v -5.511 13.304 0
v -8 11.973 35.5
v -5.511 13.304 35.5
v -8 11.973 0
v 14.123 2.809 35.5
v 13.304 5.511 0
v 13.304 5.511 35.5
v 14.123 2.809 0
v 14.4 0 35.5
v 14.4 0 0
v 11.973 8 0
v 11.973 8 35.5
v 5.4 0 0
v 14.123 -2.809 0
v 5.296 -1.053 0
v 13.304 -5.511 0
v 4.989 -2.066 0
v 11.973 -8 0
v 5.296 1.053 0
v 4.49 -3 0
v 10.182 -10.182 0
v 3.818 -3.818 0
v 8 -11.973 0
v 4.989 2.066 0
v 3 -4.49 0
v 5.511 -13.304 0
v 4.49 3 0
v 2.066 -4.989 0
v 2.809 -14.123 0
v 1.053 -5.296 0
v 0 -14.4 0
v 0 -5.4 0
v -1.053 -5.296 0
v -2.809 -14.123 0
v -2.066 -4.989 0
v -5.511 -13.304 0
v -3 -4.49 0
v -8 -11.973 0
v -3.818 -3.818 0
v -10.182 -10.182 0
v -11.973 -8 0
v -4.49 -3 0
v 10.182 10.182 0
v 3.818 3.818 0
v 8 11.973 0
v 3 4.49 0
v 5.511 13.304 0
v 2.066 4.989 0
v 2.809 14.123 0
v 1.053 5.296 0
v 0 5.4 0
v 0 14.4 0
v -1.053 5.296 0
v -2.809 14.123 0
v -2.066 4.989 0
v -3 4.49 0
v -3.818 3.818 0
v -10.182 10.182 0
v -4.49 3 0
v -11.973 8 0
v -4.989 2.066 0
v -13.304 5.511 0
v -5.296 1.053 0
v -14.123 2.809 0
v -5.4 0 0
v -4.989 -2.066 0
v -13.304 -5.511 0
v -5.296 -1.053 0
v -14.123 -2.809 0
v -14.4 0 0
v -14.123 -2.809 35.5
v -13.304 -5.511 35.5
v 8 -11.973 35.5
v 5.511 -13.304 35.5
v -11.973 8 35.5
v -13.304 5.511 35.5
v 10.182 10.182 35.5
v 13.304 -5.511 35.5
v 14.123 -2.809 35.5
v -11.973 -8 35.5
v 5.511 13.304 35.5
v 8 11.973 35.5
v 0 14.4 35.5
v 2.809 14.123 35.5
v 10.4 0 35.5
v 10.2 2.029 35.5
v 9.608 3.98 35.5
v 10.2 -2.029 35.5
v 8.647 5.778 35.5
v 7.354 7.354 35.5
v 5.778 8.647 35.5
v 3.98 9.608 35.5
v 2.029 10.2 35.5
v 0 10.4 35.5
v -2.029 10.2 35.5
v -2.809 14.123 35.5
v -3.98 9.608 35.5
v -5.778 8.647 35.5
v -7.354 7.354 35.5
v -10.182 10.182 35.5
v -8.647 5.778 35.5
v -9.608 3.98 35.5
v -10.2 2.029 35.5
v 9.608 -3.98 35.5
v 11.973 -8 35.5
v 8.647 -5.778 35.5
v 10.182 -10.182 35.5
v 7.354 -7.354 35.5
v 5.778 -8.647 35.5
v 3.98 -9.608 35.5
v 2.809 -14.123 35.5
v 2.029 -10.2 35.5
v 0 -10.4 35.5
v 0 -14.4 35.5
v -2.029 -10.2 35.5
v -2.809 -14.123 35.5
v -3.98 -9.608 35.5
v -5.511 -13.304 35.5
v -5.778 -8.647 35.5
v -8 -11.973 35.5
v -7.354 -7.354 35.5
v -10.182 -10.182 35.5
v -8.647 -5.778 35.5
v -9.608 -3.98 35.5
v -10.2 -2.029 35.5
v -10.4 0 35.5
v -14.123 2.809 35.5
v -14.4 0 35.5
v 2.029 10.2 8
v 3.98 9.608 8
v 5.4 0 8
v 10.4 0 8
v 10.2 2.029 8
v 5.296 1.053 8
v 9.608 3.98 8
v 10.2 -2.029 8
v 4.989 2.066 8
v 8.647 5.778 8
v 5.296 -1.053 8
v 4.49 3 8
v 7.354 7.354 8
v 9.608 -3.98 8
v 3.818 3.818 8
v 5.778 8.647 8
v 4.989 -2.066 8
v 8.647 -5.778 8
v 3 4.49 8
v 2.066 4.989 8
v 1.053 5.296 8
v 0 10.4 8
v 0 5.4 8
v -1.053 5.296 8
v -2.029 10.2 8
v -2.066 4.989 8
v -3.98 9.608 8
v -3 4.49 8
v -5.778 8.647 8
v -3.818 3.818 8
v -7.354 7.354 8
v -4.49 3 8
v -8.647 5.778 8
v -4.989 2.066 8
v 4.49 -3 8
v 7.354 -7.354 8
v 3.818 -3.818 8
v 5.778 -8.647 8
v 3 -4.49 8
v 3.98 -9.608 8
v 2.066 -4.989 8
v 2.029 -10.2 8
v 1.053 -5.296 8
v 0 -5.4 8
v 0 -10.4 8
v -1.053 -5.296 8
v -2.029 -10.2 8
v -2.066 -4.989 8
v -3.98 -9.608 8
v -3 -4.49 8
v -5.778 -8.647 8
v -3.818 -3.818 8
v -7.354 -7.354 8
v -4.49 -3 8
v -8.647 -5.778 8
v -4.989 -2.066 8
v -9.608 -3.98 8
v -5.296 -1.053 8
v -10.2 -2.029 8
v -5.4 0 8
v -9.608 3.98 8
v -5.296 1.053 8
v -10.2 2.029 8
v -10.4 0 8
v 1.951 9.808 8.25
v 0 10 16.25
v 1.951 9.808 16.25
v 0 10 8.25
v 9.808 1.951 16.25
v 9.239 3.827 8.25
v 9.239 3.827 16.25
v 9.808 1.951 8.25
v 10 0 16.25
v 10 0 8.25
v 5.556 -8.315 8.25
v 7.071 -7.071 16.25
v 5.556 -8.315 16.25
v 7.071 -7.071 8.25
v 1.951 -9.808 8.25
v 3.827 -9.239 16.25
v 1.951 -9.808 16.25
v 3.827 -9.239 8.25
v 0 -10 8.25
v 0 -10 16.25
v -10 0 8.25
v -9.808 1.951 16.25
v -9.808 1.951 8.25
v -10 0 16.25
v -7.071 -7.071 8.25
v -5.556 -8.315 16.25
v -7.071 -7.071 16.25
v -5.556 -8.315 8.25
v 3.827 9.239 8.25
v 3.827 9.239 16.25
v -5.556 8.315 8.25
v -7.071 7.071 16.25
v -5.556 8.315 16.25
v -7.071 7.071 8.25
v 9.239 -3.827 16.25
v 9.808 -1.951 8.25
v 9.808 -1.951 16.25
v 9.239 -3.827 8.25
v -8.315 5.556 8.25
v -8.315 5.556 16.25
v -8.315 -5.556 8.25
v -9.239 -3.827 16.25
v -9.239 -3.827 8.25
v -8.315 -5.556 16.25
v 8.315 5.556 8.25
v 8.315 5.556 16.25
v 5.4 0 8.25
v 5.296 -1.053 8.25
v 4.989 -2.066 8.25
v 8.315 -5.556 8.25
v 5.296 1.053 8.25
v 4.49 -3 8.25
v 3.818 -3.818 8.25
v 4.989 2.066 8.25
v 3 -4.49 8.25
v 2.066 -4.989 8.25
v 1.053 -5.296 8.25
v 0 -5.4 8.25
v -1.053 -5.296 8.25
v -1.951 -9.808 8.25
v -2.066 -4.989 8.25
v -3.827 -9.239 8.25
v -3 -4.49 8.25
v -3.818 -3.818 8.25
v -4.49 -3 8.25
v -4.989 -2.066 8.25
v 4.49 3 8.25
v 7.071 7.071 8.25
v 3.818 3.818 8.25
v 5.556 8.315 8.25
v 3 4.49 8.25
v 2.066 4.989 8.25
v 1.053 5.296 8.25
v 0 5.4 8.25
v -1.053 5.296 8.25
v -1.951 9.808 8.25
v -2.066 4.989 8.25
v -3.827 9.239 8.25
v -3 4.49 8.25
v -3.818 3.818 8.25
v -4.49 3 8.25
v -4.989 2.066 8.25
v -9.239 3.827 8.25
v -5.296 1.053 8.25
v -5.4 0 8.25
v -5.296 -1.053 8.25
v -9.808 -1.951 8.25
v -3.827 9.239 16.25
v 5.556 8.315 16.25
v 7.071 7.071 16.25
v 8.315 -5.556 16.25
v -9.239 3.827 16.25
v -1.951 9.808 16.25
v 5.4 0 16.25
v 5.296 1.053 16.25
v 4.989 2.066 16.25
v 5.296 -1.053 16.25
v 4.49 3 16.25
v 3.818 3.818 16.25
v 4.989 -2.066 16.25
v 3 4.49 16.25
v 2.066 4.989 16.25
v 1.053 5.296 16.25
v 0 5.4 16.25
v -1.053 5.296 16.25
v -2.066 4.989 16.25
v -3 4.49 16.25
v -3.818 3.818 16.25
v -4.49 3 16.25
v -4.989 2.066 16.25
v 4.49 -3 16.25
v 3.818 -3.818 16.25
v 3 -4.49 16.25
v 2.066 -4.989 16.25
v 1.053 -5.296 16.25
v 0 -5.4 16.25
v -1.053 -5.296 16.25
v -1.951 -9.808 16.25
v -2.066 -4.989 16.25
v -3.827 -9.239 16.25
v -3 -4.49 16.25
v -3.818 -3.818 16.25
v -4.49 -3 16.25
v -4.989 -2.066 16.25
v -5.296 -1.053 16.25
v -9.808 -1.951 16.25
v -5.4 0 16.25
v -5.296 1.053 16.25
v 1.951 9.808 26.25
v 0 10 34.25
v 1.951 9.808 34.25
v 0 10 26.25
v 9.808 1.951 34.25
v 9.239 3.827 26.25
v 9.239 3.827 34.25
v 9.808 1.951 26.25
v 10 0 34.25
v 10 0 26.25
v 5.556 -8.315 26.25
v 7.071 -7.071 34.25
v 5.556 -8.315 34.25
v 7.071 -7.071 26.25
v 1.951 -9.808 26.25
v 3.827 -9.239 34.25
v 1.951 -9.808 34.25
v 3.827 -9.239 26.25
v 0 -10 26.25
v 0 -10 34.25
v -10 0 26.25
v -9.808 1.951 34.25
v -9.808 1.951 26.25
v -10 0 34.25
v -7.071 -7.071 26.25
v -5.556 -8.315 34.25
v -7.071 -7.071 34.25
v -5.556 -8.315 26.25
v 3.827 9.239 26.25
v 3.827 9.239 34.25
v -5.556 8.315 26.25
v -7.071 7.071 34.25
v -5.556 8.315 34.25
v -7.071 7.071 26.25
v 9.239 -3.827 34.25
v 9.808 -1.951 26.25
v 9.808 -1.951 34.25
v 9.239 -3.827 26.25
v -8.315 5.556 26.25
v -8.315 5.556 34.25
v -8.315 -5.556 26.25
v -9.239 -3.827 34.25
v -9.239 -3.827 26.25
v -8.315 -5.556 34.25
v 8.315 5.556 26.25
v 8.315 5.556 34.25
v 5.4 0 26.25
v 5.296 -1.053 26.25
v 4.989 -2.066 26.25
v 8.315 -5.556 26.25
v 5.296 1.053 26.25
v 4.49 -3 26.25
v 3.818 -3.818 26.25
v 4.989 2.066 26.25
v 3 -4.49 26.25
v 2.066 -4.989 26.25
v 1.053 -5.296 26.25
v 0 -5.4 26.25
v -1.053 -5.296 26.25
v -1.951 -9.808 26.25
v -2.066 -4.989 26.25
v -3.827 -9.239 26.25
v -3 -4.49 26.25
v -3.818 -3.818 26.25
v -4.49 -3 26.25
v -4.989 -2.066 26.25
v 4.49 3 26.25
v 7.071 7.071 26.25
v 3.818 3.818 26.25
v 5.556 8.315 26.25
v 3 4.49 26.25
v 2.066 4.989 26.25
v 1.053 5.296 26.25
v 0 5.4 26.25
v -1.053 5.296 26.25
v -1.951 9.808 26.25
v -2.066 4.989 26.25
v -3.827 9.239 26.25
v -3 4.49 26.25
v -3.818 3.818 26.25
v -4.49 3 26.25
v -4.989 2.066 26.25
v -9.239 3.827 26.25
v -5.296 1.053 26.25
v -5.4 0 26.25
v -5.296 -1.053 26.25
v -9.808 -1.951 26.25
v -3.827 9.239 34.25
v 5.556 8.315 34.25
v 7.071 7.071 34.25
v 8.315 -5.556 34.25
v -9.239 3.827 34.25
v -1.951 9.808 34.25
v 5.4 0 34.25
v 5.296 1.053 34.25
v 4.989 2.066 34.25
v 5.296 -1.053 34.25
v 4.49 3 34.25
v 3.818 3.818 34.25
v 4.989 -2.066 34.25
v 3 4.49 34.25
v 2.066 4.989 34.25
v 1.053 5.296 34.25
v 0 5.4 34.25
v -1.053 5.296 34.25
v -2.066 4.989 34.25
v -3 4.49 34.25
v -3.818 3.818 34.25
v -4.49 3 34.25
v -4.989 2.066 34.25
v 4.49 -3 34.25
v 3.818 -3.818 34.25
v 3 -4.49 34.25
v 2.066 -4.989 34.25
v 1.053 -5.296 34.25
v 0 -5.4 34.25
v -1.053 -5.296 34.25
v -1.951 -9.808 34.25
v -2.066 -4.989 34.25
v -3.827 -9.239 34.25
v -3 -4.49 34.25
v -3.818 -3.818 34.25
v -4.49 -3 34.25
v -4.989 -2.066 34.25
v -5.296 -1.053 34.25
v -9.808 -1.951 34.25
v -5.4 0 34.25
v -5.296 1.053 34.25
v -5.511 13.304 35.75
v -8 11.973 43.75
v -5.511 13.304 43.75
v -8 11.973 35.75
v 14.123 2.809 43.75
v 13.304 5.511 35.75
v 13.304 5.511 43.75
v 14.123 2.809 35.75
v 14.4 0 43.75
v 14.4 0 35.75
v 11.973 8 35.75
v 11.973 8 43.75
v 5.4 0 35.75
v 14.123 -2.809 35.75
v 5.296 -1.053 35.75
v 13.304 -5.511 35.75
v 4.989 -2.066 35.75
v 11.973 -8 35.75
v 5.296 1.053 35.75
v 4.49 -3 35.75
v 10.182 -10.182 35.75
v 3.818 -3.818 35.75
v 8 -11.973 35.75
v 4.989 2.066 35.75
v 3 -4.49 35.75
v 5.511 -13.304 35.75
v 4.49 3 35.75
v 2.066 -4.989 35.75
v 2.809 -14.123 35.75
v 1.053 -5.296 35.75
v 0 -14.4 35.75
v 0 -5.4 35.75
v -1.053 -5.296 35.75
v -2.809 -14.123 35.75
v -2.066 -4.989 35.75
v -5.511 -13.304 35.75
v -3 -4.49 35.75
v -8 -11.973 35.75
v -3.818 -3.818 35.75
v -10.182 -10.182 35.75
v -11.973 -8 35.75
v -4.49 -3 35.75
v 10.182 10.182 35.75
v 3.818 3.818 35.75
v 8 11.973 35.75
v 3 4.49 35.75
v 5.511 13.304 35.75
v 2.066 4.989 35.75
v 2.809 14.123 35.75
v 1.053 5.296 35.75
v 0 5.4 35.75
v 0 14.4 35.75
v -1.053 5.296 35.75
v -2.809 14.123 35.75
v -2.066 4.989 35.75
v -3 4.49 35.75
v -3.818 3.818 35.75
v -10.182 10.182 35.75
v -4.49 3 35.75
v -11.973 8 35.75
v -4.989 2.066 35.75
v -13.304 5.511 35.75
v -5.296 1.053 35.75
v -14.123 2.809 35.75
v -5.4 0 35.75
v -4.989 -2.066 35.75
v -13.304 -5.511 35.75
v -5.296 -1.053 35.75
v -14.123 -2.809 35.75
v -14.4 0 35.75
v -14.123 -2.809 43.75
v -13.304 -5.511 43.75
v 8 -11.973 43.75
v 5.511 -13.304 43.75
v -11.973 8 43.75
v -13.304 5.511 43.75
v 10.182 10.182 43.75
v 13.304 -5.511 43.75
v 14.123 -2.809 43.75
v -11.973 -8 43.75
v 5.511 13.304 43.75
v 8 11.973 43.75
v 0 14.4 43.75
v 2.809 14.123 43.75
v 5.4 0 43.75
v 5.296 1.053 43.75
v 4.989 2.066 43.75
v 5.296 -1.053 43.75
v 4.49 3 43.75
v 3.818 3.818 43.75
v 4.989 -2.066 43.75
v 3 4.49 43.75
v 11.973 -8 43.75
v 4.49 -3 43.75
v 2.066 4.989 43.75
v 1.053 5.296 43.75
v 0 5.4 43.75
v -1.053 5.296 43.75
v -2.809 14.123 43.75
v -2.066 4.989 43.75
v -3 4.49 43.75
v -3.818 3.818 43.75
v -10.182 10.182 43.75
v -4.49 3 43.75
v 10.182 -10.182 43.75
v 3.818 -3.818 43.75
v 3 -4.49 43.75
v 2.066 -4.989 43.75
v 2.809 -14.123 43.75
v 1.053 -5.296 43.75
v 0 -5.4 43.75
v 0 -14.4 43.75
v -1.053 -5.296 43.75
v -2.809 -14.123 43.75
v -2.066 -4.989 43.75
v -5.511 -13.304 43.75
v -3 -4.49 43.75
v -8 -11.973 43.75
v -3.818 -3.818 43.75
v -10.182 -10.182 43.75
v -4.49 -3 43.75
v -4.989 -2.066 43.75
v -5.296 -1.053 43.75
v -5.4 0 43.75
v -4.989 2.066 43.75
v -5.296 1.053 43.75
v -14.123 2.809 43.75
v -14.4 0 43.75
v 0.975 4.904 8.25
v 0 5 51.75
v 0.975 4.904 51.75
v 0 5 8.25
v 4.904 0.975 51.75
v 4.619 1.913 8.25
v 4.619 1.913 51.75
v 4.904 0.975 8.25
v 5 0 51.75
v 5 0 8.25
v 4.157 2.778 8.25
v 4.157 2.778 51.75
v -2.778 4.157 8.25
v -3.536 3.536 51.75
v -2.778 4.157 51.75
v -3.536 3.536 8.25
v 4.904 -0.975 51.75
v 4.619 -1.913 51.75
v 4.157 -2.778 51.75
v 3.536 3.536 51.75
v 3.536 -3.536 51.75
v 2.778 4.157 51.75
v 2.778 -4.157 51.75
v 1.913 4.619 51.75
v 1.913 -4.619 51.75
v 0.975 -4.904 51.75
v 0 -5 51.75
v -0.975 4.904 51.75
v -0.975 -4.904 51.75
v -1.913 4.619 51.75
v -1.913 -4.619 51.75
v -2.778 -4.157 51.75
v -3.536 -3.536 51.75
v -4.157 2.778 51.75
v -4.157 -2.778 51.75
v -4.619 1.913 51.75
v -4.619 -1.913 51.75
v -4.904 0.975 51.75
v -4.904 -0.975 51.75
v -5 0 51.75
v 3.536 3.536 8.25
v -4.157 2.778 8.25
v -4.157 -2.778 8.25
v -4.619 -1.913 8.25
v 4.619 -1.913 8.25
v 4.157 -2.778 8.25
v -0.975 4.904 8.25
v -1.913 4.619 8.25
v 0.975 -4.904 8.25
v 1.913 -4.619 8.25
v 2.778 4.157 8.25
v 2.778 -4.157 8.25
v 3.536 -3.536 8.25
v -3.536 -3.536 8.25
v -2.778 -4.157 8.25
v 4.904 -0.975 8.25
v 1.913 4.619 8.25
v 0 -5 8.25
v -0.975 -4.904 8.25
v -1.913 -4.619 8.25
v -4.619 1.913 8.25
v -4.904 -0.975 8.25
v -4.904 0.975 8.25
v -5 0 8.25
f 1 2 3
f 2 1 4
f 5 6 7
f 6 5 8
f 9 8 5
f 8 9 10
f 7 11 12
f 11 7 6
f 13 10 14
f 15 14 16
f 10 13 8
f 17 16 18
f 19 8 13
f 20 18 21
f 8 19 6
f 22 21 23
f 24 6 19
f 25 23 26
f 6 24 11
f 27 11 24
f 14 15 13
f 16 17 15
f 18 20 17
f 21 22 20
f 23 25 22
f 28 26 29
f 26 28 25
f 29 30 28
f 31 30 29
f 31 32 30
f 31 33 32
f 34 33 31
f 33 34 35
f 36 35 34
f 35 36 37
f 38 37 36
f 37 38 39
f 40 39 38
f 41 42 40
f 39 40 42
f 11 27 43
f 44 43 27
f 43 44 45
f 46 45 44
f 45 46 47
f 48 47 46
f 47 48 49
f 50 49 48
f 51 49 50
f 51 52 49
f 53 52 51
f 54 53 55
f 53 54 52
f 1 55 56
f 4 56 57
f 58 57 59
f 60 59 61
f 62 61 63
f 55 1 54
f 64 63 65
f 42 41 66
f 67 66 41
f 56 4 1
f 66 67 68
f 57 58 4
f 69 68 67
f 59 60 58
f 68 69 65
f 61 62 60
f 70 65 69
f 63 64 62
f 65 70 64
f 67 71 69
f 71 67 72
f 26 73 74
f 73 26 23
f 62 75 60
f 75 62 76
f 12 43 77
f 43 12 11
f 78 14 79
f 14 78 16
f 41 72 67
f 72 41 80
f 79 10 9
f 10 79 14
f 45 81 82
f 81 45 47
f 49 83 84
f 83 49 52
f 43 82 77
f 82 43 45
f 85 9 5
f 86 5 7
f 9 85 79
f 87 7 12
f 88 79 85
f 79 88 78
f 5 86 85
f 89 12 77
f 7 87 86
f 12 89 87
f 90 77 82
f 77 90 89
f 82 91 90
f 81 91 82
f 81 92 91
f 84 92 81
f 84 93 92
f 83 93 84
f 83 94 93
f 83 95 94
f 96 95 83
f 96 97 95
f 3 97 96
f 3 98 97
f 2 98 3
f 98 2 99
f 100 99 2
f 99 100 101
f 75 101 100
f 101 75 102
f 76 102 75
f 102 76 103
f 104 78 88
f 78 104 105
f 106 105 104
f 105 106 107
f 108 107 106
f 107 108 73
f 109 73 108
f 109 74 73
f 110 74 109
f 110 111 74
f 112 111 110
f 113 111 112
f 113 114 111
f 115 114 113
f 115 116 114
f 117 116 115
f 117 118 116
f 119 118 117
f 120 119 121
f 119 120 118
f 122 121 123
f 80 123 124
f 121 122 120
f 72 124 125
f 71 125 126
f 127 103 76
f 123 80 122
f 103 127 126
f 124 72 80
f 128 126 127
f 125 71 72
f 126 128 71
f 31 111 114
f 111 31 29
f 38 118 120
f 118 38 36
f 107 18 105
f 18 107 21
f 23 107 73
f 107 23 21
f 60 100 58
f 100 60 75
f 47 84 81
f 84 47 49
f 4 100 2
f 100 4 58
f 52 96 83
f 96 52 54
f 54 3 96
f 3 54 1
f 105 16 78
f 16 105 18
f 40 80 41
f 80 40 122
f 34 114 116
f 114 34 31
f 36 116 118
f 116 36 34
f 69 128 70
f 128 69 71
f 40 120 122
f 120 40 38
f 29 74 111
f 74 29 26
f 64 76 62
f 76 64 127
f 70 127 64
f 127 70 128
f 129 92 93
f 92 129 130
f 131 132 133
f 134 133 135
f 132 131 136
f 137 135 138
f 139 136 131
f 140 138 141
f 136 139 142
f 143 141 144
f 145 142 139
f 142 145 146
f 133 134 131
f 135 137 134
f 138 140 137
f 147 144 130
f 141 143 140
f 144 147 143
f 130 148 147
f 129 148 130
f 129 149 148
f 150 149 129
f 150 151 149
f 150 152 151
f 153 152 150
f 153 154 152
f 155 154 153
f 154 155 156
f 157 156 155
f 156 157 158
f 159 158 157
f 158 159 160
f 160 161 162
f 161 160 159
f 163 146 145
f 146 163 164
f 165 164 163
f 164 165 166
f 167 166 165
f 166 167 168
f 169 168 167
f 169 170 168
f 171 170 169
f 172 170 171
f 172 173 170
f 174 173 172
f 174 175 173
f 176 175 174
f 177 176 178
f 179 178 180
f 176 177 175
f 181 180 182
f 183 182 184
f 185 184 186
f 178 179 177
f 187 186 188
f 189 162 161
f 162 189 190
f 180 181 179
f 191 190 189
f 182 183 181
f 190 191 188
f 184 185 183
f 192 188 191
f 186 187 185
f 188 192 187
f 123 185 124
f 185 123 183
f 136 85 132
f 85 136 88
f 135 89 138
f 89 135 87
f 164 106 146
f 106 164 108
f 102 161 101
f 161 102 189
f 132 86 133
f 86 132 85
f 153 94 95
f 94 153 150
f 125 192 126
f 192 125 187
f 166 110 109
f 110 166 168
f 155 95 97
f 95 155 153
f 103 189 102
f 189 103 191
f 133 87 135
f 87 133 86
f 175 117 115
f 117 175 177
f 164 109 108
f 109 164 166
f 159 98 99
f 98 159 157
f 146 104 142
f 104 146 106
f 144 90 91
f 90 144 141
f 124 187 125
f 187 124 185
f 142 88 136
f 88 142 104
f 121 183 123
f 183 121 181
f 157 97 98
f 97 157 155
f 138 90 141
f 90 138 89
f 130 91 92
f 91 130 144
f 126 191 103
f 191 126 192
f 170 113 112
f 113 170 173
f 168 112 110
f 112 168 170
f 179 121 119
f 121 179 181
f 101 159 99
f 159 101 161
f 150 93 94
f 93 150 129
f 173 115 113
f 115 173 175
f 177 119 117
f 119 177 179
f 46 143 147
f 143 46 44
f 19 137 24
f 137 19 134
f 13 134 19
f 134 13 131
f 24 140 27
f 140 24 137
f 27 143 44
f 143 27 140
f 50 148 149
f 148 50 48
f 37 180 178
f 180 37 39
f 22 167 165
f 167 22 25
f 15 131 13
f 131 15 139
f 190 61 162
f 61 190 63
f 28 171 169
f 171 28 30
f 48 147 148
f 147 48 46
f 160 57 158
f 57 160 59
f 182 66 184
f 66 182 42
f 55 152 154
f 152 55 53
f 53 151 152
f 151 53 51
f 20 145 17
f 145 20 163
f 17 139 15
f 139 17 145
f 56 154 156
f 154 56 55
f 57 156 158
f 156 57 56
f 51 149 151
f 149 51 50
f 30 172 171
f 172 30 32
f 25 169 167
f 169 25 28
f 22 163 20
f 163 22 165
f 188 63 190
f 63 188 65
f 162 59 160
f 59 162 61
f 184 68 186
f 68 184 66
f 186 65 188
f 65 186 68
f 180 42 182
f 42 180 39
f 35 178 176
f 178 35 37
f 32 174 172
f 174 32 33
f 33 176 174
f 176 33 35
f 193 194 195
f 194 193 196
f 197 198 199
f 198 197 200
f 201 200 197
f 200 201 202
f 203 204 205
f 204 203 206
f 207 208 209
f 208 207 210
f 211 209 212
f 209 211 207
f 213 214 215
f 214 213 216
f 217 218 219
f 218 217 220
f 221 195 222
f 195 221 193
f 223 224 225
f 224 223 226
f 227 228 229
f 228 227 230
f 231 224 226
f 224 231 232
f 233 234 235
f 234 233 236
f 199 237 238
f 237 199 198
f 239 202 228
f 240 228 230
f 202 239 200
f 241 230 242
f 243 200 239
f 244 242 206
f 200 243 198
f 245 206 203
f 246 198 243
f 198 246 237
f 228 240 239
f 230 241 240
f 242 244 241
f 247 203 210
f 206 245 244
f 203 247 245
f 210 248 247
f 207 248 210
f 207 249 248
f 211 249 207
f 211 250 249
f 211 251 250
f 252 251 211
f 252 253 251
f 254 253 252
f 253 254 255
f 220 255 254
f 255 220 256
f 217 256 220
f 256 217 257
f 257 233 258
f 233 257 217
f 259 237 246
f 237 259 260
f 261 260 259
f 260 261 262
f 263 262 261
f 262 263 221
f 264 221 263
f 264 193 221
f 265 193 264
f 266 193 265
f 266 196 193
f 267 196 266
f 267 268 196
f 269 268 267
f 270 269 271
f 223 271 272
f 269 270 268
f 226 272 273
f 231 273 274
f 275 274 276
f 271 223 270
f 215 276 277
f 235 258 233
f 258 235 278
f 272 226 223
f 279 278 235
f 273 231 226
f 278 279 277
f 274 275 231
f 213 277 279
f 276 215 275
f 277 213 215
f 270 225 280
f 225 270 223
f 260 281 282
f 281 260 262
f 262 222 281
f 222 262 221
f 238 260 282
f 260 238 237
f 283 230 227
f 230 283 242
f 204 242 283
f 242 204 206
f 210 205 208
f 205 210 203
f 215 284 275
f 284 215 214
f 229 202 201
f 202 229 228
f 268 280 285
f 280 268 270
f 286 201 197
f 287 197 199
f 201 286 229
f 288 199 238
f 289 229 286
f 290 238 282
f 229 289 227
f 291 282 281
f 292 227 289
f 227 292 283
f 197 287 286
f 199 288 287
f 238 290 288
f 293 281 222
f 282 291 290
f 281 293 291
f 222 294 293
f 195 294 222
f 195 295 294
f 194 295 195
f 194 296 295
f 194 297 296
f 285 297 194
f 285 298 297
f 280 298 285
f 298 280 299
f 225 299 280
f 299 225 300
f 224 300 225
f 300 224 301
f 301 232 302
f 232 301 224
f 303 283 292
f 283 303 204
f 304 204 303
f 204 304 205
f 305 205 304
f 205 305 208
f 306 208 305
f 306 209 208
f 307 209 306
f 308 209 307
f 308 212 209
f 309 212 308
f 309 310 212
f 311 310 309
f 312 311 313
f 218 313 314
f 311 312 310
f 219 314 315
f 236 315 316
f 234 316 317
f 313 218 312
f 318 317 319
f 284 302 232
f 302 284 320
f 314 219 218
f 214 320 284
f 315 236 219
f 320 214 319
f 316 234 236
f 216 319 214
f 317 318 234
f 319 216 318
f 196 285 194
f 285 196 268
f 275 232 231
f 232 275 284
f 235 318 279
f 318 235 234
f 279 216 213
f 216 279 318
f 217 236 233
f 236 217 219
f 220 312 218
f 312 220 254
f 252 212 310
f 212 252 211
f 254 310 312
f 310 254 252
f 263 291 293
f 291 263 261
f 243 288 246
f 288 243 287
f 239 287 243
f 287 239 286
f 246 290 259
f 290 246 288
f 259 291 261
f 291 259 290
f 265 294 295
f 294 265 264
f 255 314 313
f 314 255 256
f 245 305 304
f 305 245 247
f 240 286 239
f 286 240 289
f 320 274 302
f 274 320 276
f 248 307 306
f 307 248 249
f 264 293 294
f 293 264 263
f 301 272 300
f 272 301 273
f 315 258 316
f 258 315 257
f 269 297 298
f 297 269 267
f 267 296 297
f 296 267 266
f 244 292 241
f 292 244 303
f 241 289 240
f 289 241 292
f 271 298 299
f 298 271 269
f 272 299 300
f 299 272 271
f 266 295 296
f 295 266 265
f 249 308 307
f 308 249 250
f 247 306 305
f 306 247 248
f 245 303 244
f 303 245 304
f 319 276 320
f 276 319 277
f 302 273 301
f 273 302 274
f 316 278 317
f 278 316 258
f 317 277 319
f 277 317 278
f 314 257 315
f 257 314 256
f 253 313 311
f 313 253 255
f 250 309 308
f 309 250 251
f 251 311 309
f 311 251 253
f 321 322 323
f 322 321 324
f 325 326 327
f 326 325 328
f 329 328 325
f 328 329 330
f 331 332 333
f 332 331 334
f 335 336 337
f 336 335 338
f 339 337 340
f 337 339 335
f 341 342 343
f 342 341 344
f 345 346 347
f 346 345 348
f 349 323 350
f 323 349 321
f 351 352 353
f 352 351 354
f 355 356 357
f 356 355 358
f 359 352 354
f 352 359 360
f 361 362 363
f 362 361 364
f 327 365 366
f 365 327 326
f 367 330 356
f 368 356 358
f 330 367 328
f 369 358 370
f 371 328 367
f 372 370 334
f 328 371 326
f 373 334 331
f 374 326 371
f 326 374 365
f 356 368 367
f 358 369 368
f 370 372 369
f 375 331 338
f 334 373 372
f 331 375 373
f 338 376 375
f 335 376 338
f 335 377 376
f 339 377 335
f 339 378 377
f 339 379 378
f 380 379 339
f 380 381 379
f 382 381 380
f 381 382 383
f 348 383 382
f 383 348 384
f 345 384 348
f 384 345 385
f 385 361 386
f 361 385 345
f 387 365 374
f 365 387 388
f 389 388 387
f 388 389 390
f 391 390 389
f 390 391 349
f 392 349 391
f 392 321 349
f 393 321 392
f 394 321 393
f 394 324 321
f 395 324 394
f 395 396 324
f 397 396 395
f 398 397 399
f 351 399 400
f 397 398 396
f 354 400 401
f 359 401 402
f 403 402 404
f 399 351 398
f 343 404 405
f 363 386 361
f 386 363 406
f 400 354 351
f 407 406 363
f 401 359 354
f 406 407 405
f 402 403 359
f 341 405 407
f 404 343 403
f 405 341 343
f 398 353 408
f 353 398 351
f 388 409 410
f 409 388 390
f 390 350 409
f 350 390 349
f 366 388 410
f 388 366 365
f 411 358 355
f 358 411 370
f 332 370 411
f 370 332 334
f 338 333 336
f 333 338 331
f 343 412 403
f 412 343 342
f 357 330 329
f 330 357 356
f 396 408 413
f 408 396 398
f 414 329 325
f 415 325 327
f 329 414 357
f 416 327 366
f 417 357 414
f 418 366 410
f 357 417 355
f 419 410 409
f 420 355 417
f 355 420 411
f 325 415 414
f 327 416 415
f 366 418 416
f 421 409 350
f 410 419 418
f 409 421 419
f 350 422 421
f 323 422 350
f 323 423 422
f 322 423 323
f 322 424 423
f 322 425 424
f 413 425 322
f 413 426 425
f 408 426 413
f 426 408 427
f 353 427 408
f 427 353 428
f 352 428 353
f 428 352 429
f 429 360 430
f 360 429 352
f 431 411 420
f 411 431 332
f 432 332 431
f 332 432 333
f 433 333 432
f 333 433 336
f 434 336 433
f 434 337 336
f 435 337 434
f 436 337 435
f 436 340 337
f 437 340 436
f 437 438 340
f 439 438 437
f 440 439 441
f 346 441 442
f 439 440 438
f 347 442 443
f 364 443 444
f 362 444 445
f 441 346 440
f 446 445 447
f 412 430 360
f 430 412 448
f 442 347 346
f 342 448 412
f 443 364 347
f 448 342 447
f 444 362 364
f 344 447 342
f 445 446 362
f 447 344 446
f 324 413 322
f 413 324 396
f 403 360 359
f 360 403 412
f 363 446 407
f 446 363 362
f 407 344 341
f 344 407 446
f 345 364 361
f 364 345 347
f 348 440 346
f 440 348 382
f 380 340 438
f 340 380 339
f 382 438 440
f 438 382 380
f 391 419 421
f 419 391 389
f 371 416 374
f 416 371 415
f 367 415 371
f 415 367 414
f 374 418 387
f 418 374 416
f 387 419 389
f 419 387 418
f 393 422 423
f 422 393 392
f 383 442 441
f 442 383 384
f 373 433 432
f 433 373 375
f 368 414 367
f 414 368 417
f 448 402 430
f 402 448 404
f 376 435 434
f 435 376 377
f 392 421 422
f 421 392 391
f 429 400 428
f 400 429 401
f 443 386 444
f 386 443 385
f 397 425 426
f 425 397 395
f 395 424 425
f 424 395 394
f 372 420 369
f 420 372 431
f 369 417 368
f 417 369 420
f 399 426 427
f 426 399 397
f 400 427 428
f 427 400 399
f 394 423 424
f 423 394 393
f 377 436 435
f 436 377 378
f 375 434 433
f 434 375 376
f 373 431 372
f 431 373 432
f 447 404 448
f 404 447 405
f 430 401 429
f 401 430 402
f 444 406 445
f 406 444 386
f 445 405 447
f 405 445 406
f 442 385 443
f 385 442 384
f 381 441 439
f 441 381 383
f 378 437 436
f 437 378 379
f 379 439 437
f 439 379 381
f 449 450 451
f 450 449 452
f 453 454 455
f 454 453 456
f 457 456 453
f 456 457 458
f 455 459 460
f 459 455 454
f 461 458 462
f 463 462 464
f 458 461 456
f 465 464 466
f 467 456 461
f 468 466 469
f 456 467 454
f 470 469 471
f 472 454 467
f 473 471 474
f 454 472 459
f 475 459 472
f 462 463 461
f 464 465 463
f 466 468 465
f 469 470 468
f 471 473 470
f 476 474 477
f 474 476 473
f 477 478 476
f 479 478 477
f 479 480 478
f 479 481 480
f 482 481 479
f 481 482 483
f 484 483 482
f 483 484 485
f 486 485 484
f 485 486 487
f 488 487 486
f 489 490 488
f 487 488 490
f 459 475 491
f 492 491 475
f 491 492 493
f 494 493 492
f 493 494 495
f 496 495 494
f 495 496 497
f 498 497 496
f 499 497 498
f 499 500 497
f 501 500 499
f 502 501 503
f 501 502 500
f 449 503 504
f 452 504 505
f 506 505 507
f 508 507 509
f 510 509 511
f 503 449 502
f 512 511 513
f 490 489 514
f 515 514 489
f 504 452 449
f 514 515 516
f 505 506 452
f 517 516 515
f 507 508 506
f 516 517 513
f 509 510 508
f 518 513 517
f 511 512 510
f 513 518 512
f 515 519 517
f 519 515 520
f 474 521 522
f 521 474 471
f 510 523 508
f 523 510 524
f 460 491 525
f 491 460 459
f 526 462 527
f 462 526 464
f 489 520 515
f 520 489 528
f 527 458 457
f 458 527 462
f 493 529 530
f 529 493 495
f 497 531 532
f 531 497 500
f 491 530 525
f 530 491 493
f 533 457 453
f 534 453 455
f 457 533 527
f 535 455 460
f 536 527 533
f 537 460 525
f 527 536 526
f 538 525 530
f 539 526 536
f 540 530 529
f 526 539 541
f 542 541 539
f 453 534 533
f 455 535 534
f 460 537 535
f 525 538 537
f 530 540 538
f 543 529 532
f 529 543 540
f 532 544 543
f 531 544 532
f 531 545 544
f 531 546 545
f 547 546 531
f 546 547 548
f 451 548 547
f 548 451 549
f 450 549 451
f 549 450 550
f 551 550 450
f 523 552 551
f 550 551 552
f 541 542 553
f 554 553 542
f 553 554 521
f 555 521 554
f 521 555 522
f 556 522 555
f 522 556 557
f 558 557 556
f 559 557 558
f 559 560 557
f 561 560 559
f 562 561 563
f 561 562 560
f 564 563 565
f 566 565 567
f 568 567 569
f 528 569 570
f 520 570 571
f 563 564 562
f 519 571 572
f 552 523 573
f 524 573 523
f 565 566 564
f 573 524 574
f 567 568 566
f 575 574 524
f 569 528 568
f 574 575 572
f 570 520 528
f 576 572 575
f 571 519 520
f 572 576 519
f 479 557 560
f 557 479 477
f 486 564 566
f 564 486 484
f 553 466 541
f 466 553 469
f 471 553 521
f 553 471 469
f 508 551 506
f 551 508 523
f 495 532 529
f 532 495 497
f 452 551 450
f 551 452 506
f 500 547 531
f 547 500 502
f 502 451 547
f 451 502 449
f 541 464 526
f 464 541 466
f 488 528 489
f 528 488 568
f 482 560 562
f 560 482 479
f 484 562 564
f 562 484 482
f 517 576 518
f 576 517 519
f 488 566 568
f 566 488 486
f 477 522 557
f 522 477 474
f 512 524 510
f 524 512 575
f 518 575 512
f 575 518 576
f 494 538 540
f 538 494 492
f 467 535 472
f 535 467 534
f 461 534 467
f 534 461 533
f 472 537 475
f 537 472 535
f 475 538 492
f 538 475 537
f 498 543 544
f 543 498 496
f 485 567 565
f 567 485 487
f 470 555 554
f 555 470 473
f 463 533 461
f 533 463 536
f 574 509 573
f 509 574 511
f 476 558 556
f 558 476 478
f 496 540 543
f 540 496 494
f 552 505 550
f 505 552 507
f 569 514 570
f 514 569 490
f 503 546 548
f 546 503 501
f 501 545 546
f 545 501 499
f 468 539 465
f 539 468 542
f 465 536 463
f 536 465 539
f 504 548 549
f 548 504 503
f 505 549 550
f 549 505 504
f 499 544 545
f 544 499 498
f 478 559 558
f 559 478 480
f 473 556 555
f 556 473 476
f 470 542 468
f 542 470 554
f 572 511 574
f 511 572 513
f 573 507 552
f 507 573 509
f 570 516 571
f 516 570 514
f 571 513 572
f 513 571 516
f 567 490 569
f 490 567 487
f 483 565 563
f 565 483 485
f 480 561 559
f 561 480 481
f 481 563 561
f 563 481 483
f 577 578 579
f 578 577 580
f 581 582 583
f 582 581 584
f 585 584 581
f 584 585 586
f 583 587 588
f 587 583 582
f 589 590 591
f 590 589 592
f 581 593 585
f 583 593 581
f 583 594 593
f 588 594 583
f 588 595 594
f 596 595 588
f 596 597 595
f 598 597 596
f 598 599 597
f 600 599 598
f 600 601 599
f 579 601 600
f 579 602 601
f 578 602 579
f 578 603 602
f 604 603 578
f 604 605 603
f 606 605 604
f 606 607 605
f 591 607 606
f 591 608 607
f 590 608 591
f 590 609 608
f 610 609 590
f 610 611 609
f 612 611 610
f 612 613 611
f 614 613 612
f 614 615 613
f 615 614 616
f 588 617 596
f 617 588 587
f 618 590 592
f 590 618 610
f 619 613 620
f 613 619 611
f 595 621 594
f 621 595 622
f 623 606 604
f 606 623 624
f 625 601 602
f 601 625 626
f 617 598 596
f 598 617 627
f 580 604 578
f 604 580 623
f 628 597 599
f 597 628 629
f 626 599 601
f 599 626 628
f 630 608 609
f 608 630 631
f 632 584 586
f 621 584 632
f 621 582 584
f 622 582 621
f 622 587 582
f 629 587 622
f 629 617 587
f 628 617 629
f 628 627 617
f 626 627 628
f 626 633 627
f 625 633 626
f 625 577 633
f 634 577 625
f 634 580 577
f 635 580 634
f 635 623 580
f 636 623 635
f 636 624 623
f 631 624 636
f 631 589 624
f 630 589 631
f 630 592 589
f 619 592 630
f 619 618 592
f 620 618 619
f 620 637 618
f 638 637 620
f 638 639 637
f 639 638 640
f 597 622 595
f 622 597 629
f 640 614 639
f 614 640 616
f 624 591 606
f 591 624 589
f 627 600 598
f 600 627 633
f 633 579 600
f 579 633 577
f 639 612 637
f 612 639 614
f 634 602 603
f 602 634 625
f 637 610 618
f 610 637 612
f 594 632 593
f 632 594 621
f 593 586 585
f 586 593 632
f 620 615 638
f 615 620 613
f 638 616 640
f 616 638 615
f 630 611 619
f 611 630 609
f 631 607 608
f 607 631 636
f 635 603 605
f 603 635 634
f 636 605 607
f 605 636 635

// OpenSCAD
$fn = 32;

// ------------------------------------------------------------------------
// Shaft station: cup d28.8 x 35.5 mm, shaft d10
// Every part is its own module, assembly() places every instance.
// ------------------------------------------------------------------------

// --- part 1 ---
module housing_cup() {
  difference() {
    cylinder(h = 35.5, d = 28.8);
    translate([0, 0, 8]) cylinder(h = 28.5, d = 20.8);
    translate([0, 0, -1]) cylinder(h = 10, d = 10.8);
  }
}

// --- part 2 ---
module bearing_lower() {
  difference() {
      translate([0, 0, 0]) cylinder(h = 8, d = 20);
      translate([0, 0, -1]) cylinder(h = 10, d = 10.8);
    }
}

// --- part 3 ---
module bearing_upper() {
  difference() {
      translate([0, 0, 0]) cylinder(h = 8, d = 20);
      translate([0, 0, -1]) cylinder(h = 10, d = 10.8);
    }
}

// --- part 4 ---
module station_shaft() {
  translate([0, 0, -21.75]) cylinder(h = 43.5, d = 10);
}

// --- part 5 ---
module station_cover() {
  difference() {
    cylinder(h = 8, d = 28.8);
    translate([0, 0, -1]) cylinder(h = 10, d = 10.8);
  }
}

// --- assembly ---
module assembly() {
  color([0.80, 0.24, 0.20]) translate([0, 0, 0]) rotate([0, 0, 0]) housing_cup();
  color([0.20, 0.45, 0.75]) translate([0, 0, 8.25]) rotate([0, 0, 0]) bearing_lower();
  color([0.25, 0.62, 0.32]) translate([0, 0, 26.25]) rotate([0, 0, 0]) bearing_upper();
  color([0.92, 0.70, 0.18]) translate([0, 0, 30]) rotate([0, 0, 0]) station_shaft();
  color([0.58, 0.35, 0.70]) translate([0, 0, 35.75]) rotate([0, 0, 0]) station_cover();
}

assembly();
